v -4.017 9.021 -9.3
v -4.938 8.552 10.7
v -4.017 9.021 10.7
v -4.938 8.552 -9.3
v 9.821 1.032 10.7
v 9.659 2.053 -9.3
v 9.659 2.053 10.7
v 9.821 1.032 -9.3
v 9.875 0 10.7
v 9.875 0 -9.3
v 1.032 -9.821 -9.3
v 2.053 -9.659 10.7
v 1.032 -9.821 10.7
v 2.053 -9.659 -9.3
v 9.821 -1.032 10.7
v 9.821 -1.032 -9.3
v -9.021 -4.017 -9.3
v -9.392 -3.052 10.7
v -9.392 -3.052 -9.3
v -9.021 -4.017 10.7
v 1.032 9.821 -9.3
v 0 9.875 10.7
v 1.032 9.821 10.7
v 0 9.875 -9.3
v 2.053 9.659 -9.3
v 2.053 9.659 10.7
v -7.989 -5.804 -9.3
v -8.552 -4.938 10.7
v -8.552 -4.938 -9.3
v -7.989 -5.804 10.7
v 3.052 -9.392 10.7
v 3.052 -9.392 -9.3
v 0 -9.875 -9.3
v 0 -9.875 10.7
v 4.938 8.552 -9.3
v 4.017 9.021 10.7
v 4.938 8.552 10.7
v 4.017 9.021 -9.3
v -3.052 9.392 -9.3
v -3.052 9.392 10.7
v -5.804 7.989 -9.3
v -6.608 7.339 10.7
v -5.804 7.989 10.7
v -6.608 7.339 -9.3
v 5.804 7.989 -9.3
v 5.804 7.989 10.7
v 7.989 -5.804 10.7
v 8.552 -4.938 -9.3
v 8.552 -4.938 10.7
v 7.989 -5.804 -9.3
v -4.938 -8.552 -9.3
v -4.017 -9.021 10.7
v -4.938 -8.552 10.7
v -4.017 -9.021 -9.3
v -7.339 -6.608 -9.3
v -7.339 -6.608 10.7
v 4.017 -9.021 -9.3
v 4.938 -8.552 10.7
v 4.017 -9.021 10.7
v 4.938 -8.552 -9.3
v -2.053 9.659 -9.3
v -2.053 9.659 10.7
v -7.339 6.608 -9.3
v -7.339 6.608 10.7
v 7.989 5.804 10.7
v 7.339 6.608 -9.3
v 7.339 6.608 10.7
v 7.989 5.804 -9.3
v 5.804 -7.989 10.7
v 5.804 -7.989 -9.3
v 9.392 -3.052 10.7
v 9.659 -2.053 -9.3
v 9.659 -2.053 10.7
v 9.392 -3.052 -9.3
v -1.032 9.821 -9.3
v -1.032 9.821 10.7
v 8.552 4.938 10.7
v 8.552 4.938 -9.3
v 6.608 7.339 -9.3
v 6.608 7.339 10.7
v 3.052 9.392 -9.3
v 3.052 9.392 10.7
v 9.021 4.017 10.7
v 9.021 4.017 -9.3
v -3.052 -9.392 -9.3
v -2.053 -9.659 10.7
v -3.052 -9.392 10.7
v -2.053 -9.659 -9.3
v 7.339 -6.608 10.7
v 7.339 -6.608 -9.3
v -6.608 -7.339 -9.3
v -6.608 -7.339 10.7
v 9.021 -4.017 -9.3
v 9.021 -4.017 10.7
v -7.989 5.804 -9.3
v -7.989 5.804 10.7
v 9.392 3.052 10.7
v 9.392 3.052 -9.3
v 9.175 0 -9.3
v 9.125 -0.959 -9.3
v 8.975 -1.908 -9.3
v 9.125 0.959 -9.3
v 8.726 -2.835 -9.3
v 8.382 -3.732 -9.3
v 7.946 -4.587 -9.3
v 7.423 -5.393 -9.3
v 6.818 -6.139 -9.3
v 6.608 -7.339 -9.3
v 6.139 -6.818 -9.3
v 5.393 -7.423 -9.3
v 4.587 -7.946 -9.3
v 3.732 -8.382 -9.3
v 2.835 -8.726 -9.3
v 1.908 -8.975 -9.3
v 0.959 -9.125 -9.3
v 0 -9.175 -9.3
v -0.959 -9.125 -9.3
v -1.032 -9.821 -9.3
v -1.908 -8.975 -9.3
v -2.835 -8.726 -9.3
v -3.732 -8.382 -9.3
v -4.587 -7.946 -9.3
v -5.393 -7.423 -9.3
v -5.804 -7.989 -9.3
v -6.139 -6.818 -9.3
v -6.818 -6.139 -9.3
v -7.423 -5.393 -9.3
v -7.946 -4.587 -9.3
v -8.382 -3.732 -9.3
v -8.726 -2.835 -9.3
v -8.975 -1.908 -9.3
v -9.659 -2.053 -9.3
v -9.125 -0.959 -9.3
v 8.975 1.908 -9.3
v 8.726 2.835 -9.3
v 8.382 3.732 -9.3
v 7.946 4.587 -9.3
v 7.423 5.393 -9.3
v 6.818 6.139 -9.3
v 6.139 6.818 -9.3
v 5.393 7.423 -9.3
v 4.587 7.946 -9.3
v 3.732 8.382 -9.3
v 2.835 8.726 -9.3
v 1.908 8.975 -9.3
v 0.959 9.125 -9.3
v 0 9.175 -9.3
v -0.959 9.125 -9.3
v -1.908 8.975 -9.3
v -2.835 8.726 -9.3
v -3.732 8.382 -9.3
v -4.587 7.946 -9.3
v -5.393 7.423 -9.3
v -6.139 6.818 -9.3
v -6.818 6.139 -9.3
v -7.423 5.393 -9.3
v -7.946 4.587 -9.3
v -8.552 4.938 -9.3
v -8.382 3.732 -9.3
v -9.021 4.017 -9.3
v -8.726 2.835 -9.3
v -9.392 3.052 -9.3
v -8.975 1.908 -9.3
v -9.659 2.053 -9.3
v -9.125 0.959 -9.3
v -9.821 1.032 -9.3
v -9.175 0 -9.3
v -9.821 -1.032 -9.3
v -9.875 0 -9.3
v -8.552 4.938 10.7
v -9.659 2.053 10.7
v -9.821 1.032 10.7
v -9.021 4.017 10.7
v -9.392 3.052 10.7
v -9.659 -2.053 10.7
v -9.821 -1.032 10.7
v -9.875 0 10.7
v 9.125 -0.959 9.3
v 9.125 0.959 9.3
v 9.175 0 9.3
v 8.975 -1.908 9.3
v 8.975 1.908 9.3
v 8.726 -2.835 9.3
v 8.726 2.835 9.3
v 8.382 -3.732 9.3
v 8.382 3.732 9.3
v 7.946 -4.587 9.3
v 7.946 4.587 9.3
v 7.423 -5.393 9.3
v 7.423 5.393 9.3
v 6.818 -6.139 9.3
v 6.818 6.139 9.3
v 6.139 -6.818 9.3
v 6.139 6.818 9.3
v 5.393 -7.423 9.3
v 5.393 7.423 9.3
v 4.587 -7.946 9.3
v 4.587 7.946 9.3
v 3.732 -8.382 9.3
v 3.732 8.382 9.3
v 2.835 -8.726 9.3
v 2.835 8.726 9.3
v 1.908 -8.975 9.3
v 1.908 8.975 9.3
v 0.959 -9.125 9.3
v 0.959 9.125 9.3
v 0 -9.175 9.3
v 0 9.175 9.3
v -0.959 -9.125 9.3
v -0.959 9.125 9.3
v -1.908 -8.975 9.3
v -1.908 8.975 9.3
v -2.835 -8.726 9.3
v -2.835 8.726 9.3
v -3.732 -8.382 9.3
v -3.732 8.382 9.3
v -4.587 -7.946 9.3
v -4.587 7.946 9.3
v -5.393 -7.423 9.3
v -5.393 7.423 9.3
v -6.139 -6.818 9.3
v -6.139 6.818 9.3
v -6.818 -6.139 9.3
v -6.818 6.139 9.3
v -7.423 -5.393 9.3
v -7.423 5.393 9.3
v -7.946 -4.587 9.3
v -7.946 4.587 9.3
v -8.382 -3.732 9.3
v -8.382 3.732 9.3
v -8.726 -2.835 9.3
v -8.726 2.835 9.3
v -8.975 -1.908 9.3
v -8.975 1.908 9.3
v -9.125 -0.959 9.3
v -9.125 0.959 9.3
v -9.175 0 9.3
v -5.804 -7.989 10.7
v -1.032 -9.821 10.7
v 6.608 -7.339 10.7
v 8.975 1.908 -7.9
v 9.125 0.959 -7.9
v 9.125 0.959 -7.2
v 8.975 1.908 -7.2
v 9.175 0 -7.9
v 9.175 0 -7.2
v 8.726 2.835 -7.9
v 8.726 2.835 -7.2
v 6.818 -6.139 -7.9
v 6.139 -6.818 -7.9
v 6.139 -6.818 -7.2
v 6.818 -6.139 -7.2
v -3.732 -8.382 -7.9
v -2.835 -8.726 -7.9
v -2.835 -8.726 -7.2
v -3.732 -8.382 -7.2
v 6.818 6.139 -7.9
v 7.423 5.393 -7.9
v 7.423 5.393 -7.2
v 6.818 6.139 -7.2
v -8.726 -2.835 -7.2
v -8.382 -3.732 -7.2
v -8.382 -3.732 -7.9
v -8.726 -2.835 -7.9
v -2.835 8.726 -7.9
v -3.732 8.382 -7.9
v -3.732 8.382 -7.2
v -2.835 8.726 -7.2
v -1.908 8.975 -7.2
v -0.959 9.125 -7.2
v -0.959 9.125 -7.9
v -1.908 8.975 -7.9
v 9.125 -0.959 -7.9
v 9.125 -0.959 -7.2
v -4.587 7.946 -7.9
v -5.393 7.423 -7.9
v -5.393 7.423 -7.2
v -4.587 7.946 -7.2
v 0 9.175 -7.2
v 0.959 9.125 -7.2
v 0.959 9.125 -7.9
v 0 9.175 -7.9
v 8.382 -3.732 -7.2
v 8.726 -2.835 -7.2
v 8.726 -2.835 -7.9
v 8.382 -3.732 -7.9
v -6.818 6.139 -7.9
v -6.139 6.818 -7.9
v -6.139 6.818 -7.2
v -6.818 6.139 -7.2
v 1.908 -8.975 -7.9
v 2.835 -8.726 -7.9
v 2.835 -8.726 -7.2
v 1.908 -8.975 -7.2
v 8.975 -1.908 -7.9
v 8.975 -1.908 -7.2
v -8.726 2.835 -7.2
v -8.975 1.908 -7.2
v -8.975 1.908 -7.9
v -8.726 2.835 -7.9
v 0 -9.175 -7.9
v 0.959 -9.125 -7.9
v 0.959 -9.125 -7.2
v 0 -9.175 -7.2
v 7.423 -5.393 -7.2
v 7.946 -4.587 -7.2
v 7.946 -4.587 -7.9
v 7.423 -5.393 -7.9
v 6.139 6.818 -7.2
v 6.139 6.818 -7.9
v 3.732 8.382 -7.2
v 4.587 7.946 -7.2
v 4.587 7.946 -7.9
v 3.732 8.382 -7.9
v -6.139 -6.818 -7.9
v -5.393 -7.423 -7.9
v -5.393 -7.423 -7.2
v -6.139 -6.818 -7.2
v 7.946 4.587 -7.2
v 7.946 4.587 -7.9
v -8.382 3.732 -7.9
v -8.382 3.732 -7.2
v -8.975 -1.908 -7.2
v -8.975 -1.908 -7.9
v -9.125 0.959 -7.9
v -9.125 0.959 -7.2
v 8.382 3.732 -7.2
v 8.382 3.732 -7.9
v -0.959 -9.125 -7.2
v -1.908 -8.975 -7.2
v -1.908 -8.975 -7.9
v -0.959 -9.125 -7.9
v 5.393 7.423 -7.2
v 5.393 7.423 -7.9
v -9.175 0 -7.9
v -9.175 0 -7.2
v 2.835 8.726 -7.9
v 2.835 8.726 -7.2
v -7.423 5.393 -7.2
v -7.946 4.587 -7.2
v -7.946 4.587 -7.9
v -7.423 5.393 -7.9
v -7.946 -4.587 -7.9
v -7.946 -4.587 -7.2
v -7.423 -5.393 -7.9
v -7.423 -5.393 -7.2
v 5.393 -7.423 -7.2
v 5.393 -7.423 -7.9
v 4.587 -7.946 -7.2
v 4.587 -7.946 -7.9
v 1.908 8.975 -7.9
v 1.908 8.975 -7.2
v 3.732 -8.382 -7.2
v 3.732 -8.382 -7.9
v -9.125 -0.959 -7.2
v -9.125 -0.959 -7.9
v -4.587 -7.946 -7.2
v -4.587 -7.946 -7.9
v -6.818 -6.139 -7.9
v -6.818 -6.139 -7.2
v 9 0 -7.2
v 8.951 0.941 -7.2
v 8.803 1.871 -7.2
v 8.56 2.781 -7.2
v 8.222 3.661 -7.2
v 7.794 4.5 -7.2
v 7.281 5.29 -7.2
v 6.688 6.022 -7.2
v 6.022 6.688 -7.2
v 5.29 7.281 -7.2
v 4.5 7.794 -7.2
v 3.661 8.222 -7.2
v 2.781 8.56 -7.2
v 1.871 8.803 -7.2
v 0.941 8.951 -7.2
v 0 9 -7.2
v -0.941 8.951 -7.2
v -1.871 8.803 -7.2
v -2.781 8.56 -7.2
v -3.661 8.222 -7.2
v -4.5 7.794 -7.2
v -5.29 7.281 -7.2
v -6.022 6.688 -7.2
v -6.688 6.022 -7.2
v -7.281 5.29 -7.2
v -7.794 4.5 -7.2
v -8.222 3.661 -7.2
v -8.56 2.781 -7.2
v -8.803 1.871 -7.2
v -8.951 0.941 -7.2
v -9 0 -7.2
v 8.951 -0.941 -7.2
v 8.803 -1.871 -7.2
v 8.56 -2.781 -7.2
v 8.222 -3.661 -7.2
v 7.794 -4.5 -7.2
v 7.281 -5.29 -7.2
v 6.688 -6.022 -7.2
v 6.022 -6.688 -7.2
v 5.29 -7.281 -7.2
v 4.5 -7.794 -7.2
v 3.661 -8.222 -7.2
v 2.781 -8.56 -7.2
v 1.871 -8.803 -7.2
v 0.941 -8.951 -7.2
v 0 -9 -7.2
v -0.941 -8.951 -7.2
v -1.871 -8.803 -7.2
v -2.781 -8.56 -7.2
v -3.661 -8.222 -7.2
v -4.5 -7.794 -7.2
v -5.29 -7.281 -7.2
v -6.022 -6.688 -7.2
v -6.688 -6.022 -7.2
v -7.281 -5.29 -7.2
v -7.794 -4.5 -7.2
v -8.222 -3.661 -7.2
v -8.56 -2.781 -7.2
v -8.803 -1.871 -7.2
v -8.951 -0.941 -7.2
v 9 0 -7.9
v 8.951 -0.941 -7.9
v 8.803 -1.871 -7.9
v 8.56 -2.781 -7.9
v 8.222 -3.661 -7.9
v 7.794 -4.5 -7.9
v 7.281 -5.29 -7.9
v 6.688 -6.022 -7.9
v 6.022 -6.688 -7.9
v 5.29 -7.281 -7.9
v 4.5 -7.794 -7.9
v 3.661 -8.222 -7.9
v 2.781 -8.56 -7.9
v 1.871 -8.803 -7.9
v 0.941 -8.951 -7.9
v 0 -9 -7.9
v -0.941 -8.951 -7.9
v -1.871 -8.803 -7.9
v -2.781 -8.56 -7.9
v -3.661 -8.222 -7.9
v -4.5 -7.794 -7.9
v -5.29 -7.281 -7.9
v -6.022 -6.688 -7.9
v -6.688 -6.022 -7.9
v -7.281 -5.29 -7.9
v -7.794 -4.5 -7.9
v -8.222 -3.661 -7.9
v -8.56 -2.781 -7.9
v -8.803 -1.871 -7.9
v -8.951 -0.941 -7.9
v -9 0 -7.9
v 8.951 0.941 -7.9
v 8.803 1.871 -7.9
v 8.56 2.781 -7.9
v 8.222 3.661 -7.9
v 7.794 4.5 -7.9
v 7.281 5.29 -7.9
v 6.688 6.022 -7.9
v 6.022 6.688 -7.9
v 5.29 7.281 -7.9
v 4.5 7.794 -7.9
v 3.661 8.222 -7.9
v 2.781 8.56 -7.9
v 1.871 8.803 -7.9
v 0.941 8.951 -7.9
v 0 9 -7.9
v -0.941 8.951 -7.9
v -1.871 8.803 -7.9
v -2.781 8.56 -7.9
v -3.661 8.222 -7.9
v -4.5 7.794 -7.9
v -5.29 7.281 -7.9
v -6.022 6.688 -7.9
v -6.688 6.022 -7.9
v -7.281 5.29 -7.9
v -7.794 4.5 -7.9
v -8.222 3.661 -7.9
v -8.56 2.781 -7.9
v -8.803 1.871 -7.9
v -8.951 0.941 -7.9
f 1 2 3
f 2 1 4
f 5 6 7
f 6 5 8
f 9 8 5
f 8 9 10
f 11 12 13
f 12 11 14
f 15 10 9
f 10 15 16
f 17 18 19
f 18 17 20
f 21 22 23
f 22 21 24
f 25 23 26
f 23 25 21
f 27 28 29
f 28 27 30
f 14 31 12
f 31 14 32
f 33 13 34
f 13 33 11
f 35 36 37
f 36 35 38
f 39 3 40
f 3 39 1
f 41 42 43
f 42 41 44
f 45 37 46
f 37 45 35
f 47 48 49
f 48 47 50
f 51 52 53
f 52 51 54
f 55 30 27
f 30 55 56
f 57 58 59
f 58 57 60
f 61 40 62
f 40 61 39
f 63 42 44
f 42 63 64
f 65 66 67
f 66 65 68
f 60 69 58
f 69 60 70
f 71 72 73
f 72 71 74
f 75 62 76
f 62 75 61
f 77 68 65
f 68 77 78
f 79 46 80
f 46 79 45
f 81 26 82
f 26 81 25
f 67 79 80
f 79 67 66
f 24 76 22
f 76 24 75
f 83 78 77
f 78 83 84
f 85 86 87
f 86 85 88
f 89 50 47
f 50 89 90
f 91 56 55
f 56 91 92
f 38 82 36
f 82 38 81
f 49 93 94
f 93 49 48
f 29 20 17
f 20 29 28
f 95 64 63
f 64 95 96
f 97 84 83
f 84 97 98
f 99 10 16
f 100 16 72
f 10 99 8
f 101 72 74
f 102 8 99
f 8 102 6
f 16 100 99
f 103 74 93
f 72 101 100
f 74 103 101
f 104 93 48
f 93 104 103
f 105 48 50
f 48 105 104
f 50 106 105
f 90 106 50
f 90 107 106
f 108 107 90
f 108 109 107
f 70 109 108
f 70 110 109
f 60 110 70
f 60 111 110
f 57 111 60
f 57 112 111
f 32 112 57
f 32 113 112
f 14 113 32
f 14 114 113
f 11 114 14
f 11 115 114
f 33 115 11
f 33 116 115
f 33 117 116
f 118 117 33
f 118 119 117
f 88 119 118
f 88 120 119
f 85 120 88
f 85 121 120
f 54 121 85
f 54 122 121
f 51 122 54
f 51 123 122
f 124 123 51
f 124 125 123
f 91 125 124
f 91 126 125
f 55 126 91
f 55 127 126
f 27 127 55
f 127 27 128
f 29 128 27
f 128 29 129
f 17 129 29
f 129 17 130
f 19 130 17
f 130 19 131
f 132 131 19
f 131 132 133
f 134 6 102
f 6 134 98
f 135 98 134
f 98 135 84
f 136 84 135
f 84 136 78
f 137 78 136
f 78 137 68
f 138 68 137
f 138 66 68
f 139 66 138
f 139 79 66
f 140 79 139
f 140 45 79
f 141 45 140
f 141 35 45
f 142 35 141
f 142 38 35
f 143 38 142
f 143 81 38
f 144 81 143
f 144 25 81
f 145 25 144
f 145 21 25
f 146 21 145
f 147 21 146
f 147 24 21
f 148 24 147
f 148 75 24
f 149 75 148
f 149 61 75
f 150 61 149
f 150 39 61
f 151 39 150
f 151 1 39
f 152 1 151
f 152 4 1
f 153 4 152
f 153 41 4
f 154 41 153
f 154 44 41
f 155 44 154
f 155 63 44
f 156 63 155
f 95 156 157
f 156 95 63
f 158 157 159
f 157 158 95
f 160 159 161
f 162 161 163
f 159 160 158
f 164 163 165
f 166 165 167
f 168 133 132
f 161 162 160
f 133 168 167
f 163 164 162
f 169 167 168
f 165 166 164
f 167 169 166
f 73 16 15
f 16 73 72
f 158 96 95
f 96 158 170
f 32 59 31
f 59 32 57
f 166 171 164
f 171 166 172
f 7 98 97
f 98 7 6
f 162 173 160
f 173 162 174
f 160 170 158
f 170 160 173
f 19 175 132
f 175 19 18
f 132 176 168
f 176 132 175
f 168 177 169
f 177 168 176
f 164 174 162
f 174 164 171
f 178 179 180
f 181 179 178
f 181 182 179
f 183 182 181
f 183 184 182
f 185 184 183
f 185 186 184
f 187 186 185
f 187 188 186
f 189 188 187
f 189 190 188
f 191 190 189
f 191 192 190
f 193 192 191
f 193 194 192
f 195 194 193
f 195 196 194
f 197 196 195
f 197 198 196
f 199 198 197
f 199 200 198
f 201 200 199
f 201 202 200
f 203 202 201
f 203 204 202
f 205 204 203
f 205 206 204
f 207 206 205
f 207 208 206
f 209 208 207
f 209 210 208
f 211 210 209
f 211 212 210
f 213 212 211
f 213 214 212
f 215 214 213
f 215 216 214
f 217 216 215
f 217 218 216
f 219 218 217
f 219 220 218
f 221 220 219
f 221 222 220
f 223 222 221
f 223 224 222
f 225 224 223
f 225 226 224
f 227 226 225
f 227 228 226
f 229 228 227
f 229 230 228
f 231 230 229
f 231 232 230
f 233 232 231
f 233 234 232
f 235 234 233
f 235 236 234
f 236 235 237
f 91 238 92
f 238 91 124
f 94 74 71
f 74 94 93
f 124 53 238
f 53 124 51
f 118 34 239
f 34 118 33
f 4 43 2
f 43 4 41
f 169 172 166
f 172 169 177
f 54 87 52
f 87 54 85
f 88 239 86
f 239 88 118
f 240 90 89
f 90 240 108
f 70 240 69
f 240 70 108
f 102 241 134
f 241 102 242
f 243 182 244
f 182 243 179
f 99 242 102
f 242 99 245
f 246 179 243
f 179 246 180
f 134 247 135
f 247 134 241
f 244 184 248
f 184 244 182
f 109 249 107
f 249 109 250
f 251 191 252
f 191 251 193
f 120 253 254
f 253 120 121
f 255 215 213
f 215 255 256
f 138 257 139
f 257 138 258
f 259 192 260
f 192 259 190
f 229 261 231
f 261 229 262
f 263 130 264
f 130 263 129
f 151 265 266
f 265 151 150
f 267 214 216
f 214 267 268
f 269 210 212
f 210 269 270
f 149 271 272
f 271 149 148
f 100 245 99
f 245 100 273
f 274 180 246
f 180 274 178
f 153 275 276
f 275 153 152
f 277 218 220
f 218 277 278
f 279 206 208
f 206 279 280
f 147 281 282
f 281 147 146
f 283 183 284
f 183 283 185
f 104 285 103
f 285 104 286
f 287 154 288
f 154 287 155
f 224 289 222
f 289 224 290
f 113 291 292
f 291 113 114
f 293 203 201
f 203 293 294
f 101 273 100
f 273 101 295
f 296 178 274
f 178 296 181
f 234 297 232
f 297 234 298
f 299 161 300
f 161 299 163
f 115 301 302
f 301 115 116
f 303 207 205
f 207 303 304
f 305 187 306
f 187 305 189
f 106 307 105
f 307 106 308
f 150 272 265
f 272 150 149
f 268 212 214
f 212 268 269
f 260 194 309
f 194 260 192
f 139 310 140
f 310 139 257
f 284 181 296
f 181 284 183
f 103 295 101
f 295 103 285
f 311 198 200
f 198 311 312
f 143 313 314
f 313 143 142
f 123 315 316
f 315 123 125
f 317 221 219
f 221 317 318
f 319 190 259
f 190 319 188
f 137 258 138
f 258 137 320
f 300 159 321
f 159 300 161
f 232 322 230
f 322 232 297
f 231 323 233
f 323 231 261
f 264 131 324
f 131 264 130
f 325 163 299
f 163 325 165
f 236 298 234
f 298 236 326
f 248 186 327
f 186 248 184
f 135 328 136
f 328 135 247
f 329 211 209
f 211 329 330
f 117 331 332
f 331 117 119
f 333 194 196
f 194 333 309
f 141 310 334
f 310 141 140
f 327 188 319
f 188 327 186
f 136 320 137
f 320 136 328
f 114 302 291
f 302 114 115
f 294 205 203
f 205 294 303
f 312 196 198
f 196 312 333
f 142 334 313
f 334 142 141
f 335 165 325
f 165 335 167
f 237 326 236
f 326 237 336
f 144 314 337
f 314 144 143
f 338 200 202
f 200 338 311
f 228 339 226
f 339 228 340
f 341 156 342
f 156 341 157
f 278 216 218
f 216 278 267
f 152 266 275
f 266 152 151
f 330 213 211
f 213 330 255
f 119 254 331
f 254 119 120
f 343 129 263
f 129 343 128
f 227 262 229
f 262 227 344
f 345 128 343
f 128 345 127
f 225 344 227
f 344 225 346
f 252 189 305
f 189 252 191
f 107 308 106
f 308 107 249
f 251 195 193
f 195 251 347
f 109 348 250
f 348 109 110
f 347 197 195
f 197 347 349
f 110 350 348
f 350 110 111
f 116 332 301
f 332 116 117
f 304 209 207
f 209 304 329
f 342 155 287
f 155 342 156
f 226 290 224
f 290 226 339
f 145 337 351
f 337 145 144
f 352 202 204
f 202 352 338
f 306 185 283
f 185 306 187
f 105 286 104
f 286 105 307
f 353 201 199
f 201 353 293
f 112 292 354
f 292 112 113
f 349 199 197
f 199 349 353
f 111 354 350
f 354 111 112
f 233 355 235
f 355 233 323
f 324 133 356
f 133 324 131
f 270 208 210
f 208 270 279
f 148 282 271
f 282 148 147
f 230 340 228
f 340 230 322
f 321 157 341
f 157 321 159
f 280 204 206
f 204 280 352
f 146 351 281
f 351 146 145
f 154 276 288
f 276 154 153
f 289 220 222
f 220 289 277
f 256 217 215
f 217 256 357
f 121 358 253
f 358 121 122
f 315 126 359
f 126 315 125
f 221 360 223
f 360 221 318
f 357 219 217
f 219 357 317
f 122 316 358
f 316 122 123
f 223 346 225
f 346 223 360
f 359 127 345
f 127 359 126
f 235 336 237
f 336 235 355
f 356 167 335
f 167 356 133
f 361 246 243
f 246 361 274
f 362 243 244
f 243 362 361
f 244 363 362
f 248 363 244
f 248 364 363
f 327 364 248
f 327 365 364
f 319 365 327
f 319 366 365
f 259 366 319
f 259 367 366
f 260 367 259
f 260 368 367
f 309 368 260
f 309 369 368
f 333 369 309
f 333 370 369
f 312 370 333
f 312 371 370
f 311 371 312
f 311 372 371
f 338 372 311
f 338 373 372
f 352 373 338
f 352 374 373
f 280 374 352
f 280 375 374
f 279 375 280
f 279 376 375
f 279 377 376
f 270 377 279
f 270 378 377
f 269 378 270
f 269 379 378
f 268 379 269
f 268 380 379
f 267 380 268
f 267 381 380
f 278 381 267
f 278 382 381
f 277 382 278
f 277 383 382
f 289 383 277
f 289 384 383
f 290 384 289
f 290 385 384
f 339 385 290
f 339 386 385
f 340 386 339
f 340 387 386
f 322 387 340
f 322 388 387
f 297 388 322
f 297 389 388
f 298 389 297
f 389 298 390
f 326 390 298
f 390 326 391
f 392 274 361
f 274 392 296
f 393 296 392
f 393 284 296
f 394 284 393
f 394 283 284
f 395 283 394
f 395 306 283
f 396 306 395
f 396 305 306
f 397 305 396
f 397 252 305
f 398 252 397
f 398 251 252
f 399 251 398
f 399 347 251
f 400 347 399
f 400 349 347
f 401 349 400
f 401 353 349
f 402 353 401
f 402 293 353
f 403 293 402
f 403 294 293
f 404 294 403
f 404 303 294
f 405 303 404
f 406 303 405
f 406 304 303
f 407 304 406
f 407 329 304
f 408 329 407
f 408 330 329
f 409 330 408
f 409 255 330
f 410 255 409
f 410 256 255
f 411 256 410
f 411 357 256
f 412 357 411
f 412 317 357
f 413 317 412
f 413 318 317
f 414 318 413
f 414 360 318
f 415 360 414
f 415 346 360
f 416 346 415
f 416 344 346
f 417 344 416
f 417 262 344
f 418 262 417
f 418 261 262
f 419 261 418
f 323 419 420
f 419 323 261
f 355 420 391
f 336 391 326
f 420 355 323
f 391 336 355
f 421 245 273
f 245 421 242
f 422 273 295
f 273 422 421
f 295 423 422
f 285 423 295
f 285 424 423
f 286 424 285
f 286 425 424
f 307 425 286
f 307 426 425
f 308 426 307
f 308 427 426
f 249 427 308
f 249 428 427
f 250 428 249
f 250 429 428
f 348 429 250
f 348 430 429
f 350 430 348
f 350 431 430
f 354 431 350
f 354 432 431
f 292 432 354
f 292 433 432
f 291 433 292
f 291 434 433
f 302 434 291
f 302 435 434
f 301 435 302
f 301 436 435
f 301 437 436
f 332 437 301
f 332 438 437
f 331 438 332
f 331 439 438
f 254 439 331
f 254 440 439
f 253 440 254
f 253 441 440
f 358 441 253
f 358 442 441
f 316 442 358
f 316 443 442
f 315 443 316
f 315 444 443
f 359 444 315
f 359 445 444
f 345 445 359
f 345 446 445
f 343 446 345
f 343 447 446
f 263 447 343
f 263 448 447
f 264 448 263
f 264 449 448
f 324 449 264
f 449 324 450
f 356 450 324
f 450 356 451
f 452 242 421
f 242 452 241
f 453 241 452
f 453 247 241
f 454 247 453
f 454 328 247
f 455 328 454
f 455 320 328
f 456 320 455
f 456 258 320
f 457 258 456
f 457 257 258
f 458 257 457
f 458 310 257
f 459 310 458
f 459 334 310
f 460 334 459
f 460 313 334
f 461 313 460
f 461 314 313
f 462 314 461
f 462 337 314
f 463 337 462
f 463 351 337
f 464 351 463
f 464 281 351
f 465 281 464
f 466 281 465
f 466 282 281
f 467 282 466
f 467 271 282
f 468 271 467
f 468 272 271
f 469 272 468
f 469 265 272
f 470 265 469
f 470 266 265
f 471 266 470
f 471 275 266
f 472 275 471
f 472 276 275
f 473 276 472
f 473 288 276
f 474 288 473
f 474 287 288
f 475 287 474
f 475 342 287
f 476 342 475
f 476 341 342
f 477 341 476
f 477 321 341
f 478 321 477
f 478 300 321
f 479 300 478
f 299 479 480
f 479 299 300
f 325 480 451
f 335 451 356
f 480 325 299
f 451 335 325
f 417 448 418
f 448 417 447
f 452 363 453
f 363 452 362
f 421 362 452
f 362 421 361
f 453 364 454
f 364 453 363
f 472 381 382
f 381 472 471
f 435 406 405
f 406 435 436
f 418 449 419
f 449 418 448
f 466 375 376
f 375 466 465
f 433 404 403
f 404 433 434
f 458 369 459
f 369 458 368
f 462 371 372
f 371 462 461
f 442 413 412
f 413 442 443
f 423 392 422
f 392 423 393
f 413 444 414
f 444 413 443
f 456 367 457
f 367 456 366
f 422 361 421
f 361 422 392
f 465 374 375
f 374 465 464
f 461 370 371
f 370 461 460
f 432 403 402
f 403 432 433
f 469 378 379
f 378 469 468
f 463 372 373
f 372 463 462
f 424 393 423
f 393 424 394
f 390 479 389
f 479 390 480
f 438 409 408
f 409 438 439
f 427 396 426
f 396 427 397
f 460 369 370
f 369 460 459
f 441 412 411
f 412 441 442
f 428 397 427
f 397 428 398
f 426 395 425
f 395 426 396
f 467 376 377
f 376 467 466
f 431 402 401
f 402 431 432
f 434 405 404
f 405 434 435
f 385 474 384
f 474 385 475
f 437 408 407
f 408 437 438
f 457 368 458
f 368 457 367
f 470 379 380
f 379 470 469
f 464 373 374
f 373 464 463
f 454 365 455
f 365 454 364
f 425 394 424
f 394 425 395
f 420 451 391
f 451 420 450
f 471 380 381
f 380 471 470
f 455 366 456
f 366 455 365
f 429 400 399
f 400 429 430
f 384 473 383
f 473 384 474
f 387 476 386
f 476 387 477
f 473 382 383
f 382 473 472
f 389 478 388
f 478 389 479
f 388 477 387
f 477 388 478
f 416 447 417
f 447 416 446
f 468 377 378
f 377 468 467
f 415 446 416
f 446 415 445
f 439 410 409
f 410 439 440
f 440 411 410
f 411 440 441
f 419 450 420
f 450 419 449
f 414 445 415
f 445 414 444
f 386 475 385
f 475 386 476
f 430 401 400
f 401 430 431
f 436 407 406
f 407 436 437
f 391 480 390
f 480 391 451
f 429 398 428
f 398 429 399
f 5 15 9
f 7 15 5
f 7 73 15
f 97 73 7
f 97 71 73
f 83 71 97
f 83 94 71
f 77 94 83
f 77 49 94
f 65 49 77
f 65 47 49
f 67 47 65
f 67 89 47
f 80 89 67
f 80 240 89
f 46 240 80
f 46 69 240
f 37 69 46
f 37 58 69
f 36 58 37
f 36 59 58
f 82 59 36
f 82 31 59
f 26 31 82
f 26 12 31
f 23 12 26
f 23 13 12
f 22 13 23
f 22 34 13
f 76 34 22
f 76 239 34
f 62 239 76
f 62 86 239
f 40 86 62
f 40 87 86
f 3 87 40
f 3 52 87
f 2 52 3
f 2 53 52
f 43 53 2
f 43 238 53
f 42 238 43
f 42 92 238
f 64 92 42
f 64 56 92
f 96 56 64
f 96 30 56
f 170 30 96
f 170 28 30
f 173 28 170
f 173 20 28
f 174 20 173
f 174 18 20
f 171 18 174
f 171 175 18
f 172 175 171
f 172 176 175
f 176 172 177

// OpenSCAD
$fn = 60;

outer_diameter = 19.75;
inner_diameter = 18.35;
height = 20;

inner_lip_diameter = 18.00;
inner_lip_bottom = 1.75;
inner_lip_top = 2.45;

thickness = outer_diameter - inner_diameter;
inner_lip_height = inner_lip_top - inner_lip_bottom;
cylinder_height = height - thickness; // So we can put a "disc" on the top

union()
{
    // Outer cylinder
    difference()
    {
        cylinder(h = cylinder_height, r = outer_diameter / 2, center = true);
        cylinder(h = cylinder_height, r = inner_diameter / 2, center = true);
    }

    // top
    color("red") translate([ 0, 0, cylinder_height / 2 ])
        cylinder(h = thickness, r = outer_diameter / 2, center = false);

    // lip
    color("green") translate([ 0, 0, (-(cylinder_height) / 2) + inner_lip_bottom ]) difference()
    {
        cylinder(h = inner_lip_height, r = inner_diameter / 2, center = true);
        cylinder(h = inner_lip_height, r = inner_lip_diameter / 2, center = true);
    }
}
